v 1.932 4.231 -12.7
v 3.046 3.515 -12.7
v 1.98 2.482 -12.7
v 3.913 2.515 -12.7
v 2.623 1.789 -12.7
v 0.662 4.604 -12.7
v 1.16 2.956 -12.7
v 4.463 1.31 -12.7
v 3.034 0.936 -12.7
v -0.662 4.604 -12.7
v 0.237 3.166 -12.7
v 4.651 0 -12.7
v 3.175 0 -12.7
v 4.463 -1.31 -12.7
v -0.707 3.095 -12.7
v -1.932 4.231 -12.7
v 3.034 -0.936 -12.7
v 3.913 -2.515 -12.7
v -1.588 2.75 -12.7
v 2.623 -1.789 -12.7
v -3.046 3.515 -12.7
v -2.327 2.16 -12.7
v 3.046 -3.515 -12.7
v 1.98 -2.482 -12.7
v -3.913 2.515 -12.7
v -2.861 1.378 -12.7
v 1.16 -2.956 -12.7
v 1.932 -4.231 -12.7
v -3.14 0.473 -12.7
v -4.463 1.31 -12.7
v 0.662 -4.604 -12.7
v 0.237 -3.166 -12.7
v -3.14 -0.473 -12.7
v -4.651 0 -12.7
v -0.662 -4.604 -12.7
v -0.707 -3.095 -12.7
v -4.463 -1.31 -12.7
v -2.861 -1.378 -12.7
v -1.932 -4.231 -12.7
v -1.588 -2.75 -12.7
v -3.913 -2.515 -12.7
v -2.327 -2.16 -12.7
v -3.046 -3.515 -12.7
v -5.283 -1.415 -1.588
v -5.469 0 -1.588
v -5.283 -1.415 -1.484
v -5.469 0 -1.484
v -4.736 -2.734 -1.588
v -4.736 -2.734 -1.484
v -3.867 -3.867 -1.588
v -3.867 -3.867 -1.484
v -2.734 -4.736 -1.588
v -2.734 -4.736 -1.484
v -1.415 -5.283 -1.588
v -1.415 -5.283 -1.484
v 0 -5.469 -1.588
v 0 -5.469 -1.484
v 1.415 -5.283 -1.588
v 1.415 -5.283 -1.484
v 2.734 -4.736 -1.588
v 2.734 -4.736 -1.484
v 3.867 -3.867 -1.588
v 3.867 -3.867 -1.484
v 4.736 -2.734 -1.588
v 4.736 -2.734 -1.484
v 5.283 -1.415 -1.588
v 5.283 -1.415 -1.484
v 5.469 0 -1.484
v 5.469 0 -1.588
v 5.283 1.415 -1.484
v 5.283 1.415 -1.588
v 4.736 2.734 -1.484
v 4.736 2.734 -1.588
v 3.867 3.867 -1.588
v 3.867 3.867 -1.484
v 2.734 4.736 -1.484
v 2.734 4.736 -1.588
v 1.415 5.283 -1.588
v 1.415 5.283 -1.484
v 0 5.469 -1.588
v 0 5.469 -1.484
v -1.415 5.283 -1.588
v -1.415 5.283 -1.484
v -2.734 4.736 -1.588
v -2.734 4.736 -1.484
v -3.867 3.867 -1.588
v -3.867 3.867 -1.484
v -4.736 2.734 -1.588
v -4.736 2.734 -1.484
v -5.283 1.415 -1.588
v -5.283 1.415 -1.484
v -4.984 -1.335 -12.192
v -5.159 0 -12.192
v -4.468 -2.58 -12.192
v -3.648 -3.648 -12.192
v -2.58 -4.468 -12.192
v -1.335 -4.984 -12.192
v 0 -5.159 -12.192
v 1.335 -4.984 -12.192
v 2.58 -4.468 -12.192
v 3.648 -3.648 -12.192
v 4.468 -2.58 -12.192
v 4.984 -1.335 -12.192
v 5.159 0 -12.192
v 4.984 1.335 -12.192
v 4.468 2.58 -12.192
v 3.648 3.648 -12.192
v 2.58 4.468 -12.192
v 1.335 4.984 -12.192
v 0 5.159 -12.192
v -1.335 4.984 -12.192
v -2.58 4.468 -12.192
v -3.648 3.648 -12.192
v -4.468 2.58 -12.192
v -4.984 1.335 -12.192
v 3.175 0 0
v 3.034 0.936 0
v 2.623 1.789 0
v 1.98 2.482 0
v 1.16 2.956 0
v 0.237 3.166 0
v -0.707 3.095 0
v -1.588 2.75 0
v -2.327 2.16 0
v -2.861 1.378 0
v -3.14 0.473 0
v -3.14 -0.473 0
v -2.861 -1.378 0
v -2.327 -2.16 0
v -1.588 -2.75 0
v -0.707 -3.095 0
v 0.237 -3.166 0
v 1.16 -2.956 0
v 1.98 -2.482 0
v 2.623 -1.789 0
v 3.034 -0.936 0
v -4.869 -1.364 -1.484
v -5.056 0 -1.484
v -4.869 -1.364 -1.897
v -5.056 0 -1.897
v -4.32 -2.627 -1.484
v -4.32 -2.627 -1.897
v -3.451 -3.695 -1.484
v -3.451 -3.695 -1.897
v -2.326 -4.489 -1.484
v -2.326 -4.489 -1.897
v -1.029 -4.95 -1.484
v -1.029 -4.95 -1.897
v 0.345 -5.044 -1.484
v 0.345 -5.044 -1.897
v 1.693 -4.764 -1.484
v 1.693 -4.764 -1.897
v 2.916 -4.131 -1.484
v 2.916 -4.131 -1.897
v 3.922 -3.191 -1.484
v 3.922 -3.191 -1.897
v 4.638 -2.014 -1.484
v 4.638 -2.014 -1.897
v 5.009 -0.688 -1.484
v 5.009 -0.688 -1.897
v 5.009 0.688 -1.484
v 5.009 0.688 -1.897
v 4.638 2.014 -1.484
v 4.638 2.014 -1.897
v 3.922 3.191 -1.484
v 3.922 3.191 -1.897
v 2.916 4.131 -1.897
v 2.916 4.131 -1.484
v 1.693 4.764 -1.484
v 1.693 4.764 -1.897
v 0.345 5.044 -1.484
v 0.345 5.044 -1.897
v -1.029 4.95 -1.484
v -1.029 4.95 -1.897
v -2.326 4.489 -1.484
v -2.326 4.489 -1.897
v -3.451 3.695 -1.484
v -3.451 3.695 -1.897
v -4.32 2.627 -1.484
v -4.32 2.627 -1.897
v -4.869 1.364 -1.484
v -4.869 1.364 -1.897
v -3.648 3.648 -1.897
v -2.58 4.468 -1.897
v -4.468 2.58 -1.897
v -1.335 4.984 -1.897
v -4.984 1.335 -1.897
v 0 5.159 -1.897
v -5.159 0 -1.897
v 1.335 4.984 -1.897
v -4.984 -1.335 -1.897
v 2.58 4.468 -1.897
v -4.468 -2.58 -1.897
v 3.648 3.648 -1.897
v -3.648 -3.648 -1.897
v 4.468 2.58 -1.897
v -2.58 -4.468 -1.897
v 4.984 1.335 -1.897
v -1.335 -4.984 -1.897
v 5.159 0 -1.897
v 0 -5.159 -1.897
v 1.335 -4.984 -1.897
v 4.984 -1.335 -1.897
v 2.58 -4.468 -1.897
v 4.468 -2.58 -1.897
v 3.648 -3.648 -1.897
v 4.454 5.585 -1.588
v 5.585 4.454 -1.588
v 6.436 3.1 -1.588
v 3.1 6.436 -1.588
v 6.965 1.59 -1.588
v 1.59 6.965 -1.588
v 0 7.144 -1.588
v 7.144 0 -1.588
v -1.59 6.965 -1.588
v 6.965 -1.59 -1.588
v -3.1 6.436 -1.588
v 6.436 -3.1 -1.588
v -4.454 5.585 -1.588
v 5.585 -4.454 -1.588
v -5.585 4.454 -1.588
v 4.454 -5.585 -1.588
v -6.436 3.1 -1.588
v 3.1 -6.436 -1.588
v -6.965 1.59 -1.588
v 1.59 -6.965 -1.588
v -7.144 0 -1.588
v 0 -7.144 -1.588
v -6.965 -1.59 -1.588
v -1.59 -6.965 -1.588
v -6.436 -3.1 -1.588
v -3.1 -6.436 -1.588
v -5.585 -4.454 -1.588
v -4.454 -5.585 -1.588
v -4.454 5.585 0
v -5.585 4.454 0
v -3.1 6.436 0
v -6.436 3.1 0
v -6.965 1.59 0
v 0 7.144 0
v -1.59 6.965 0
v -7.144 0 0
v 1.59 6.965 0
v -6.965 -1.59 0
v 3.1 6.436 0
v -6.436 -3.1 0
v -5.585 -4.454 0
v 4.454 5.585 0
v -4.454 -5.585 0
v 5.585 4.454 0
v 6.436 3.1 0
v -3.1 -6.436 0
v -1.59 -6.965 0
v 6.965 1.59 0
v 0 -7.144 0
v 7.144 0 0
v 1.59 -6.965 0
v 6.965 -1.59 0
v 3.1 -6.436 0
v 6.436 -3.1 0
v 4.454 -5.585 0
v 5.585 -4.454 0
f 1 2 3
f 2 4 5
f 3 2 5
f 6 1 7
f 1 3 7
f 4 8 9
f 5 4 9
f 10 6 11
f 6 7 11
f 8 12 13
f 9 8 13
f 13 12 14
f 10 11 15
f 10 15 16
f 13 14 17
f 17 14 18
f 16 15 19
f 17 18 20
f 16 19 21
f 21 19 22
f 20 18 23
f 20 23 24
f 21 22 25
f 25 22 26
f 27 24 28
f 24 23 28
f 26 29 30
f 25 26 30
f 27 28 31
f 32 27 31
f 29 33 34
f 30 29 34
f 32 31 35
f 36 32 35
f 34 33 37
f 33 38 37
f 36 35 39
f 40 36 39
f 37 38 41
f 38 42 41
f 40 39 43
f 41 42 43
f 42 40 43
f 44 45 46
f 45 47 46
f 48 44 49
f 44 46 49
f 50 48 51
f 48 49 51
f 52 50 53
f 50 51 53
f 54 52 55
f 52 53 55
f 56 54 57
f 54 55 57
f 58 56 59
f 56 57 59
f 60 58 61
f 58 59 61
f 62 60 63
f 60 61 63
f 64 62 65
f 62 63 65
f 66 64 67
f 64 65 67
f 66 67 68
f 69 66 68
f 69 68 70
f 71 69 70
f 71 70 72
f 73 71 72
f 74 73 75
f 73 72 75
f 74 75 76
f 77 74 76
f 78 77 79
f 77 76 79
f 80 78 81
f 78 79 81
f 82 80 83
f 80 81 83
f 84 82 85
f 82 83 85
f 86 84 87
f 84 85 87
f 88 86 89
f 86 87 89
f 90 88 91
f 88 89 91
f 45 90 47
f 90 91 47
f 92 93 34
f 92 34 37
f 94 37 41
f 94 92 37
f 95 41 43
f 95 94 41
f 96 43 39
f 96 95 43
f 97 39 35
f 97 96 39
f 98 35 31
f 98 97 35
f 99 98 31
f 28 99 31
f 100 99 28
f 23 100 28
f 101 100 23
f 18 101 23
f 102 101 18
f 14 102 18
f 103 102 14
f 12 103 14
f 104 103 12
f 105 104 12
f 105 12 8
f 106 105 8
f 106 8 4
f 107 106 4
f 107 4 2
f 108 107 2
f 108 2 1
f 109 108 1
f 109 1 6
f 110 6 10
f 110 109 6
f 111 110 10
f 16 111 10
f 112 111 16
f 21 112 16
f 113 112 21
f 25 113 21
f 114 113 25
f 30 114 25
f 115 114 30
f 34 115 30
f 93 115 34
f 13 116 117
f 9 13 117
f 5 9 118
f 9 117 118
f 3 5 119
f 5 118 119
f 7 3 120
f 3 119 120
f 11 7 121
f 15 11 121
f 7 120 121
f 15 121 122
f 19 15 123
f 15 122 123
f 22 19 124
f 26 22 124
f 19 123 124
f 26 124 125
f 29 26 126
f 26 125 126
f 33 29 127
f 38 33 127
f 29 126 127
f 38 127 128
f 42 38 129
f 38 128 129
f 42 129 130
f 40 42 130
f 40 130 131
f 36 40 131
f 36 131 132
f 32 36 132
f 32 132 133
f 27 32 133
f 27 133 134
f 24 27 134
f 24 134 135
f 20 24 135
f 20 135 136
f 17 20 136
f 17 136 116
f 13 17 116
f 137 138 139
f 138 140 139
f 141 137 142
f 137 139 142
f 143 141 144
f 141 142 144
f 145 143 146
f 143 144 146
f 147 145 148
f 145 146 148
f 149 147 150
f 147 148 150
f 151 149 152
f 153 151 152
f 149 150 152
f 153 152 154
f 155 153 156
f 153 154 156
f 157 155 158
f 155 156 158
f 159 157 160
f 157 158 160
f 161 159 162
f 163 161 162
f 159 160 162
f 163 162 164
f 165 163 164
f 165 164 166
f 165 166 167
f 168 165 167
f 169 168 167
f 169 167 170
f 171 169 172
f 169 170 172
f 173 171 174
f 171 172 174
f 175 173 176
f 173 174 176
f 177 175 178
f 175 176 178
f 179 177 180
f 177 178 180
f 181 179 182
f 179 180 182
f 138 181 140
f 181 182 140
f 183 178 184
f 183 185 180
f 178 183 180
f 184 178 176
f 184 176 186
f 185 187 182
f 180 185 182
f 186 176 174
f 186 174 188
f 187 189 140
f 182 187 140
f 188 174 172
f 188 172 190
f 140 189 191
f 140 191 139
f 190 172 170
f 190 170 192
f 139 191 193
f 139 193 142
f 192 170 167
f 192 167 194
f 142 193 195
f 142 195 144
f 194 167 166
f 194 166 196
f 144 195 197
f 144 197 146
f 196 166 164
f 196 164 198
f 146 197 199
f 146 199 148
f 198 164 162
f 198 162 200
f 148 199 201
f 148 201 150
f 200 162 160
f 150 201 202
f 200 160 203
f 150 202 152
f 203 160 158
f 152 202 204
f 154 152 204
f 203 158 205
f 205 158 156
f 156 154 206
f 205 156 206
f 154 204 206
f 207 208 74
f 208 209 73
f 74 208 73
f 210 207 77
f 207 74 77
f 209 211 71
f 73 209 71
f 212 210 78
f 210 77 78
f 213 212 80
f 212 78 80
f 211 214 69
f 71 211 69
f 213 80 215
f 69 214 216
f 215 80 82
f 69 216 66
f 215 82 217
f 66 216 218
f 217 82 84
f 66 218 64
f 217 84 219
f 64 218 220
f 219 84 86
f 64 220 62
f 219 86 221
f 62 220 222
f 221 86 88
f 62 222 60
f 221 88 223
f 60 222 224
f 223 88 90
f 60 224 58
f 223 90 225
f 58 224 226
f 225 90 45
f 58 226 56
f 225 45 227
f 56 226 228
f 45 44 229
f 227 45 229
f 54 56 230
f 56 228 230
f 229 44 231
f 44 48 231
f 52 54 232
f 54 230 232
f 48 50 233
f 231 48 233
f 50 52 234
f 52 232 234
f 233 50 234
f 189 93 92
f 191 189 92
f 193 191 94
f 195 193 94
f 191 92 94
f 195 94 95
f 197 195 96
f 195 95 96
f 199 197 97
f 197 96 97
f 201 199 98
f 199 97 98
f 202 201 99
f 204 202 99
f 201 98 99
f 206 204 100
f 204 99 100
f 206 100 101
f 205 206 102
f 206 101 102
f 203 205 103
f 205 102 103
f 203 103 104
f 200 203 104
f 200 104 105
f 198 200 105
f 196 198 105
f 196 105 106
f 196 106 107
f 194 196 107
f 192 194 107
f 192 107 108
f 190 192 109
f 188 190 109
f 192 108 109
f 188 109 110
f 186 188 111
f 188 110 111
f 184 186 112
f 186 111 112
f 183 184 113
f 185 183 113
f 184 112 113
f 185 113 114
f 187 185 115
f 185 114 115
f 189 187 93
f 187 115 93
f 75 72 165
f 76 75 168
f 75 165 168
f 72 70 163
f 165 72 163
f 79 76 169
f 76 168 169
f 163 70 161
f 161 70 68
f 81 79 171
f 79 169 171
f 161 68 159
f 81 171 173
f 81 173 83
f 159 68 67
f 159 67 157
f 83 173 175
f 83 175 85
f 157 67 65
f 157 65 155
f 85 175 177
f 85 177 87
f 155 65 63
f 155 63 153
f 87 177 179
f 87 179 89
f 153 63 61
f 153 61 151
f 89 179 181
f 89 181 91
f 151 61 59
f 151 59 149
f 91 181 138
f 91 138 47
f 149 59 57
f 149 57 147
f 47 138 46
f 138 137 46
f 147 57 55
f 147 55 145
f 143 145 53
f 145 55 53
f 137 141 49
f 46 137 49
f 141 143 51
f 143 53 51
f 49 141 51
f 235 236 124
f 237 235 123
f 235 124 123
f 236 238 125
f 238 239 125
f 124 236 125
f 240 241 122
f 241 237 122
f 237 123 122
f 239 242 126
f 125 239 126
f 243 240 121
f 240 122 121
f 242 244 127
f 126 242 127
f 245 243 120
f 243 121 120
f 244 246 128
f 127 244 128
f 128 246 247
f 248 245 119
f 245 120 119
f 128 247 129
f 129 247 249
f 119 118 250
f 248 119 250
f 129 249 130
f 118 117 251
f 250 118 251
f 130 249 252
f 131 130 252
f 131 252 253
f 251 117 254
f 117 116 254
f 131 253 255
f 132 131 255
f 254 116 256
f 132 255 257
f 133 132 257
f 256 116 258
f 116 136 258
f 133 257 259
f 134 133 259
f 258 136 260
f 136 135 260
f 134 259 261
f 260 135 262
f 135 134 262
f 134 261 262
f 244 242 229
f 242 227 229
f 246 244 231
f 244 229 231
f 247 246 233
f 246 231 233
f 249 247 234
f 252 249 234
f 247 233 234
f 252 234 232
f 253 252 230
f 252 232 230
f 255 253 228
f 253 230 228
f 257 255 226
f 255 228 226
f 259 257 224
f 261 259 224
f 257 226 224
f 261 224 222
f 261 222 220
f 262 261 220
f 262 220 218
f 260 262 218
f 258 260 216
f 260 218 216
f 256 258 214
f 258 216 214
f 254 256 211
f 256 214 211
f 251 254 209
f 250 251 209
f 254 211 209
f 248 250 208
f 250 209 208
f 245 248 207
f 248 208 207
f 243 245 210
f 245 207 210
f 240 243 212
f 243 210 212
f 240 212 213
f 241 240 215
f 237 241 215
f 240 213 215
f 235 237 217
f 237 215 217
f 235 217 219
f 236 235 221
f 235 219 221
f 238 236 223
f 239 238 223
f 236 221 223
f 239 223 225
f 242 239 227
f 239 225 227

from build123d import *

# Parameters (mm, degrees)
SKETCH2_R          = 3.175
CUT_EXTRUDE1_DEPTH = 17.228257088
CHAMFER1_SIZE      = 0.508


with BuildPart() as part:
    # Sketch1 → Revolve1 (revolve)
    with BuildSketch(Plane(origin=(0, 0, 0), x_dir=(0, 0, -1), z_dir=(1, 0, 0)), mode=Mode.PRIVATE) as revolve1_sk:
        Polygon((0, 0), (0, 7.14375), (1.5875, 7.14375), (1.5875, 5.4689375), (1.4843125, 5.4689375), (1.4843125, 5.0561875), (1.8970625, 5.0561875), (1.8970625, 5.159375), (12.7, 5.159375), (12.7, 0), align=None)
    revolve(revolve1_sk.sketch.rotate(Axis((0, 0, 0), (0, 0, 1)), 90), axis=Axis((0, 0, 0), (0, 0, 1)))

    # Sketch2 → Cut-Extrude1 (cut, through all)
    with BuildSketch(Plane.XY):
        Circle(SKETCH2_R)
    extrude(amount=-CUT_EXTRUDE1_DEPTH, mode=Mode.SUBTRACT)

    # Chamfer1
    chamfer1_edges = [part.edges().sort_by_distance(p)[0] for p in [
        (5.159375, 0, -12.7),
    ]]
    chamfer(chamfer1_edges, length=CHAMFER1_SIZE)


solid = part.part
